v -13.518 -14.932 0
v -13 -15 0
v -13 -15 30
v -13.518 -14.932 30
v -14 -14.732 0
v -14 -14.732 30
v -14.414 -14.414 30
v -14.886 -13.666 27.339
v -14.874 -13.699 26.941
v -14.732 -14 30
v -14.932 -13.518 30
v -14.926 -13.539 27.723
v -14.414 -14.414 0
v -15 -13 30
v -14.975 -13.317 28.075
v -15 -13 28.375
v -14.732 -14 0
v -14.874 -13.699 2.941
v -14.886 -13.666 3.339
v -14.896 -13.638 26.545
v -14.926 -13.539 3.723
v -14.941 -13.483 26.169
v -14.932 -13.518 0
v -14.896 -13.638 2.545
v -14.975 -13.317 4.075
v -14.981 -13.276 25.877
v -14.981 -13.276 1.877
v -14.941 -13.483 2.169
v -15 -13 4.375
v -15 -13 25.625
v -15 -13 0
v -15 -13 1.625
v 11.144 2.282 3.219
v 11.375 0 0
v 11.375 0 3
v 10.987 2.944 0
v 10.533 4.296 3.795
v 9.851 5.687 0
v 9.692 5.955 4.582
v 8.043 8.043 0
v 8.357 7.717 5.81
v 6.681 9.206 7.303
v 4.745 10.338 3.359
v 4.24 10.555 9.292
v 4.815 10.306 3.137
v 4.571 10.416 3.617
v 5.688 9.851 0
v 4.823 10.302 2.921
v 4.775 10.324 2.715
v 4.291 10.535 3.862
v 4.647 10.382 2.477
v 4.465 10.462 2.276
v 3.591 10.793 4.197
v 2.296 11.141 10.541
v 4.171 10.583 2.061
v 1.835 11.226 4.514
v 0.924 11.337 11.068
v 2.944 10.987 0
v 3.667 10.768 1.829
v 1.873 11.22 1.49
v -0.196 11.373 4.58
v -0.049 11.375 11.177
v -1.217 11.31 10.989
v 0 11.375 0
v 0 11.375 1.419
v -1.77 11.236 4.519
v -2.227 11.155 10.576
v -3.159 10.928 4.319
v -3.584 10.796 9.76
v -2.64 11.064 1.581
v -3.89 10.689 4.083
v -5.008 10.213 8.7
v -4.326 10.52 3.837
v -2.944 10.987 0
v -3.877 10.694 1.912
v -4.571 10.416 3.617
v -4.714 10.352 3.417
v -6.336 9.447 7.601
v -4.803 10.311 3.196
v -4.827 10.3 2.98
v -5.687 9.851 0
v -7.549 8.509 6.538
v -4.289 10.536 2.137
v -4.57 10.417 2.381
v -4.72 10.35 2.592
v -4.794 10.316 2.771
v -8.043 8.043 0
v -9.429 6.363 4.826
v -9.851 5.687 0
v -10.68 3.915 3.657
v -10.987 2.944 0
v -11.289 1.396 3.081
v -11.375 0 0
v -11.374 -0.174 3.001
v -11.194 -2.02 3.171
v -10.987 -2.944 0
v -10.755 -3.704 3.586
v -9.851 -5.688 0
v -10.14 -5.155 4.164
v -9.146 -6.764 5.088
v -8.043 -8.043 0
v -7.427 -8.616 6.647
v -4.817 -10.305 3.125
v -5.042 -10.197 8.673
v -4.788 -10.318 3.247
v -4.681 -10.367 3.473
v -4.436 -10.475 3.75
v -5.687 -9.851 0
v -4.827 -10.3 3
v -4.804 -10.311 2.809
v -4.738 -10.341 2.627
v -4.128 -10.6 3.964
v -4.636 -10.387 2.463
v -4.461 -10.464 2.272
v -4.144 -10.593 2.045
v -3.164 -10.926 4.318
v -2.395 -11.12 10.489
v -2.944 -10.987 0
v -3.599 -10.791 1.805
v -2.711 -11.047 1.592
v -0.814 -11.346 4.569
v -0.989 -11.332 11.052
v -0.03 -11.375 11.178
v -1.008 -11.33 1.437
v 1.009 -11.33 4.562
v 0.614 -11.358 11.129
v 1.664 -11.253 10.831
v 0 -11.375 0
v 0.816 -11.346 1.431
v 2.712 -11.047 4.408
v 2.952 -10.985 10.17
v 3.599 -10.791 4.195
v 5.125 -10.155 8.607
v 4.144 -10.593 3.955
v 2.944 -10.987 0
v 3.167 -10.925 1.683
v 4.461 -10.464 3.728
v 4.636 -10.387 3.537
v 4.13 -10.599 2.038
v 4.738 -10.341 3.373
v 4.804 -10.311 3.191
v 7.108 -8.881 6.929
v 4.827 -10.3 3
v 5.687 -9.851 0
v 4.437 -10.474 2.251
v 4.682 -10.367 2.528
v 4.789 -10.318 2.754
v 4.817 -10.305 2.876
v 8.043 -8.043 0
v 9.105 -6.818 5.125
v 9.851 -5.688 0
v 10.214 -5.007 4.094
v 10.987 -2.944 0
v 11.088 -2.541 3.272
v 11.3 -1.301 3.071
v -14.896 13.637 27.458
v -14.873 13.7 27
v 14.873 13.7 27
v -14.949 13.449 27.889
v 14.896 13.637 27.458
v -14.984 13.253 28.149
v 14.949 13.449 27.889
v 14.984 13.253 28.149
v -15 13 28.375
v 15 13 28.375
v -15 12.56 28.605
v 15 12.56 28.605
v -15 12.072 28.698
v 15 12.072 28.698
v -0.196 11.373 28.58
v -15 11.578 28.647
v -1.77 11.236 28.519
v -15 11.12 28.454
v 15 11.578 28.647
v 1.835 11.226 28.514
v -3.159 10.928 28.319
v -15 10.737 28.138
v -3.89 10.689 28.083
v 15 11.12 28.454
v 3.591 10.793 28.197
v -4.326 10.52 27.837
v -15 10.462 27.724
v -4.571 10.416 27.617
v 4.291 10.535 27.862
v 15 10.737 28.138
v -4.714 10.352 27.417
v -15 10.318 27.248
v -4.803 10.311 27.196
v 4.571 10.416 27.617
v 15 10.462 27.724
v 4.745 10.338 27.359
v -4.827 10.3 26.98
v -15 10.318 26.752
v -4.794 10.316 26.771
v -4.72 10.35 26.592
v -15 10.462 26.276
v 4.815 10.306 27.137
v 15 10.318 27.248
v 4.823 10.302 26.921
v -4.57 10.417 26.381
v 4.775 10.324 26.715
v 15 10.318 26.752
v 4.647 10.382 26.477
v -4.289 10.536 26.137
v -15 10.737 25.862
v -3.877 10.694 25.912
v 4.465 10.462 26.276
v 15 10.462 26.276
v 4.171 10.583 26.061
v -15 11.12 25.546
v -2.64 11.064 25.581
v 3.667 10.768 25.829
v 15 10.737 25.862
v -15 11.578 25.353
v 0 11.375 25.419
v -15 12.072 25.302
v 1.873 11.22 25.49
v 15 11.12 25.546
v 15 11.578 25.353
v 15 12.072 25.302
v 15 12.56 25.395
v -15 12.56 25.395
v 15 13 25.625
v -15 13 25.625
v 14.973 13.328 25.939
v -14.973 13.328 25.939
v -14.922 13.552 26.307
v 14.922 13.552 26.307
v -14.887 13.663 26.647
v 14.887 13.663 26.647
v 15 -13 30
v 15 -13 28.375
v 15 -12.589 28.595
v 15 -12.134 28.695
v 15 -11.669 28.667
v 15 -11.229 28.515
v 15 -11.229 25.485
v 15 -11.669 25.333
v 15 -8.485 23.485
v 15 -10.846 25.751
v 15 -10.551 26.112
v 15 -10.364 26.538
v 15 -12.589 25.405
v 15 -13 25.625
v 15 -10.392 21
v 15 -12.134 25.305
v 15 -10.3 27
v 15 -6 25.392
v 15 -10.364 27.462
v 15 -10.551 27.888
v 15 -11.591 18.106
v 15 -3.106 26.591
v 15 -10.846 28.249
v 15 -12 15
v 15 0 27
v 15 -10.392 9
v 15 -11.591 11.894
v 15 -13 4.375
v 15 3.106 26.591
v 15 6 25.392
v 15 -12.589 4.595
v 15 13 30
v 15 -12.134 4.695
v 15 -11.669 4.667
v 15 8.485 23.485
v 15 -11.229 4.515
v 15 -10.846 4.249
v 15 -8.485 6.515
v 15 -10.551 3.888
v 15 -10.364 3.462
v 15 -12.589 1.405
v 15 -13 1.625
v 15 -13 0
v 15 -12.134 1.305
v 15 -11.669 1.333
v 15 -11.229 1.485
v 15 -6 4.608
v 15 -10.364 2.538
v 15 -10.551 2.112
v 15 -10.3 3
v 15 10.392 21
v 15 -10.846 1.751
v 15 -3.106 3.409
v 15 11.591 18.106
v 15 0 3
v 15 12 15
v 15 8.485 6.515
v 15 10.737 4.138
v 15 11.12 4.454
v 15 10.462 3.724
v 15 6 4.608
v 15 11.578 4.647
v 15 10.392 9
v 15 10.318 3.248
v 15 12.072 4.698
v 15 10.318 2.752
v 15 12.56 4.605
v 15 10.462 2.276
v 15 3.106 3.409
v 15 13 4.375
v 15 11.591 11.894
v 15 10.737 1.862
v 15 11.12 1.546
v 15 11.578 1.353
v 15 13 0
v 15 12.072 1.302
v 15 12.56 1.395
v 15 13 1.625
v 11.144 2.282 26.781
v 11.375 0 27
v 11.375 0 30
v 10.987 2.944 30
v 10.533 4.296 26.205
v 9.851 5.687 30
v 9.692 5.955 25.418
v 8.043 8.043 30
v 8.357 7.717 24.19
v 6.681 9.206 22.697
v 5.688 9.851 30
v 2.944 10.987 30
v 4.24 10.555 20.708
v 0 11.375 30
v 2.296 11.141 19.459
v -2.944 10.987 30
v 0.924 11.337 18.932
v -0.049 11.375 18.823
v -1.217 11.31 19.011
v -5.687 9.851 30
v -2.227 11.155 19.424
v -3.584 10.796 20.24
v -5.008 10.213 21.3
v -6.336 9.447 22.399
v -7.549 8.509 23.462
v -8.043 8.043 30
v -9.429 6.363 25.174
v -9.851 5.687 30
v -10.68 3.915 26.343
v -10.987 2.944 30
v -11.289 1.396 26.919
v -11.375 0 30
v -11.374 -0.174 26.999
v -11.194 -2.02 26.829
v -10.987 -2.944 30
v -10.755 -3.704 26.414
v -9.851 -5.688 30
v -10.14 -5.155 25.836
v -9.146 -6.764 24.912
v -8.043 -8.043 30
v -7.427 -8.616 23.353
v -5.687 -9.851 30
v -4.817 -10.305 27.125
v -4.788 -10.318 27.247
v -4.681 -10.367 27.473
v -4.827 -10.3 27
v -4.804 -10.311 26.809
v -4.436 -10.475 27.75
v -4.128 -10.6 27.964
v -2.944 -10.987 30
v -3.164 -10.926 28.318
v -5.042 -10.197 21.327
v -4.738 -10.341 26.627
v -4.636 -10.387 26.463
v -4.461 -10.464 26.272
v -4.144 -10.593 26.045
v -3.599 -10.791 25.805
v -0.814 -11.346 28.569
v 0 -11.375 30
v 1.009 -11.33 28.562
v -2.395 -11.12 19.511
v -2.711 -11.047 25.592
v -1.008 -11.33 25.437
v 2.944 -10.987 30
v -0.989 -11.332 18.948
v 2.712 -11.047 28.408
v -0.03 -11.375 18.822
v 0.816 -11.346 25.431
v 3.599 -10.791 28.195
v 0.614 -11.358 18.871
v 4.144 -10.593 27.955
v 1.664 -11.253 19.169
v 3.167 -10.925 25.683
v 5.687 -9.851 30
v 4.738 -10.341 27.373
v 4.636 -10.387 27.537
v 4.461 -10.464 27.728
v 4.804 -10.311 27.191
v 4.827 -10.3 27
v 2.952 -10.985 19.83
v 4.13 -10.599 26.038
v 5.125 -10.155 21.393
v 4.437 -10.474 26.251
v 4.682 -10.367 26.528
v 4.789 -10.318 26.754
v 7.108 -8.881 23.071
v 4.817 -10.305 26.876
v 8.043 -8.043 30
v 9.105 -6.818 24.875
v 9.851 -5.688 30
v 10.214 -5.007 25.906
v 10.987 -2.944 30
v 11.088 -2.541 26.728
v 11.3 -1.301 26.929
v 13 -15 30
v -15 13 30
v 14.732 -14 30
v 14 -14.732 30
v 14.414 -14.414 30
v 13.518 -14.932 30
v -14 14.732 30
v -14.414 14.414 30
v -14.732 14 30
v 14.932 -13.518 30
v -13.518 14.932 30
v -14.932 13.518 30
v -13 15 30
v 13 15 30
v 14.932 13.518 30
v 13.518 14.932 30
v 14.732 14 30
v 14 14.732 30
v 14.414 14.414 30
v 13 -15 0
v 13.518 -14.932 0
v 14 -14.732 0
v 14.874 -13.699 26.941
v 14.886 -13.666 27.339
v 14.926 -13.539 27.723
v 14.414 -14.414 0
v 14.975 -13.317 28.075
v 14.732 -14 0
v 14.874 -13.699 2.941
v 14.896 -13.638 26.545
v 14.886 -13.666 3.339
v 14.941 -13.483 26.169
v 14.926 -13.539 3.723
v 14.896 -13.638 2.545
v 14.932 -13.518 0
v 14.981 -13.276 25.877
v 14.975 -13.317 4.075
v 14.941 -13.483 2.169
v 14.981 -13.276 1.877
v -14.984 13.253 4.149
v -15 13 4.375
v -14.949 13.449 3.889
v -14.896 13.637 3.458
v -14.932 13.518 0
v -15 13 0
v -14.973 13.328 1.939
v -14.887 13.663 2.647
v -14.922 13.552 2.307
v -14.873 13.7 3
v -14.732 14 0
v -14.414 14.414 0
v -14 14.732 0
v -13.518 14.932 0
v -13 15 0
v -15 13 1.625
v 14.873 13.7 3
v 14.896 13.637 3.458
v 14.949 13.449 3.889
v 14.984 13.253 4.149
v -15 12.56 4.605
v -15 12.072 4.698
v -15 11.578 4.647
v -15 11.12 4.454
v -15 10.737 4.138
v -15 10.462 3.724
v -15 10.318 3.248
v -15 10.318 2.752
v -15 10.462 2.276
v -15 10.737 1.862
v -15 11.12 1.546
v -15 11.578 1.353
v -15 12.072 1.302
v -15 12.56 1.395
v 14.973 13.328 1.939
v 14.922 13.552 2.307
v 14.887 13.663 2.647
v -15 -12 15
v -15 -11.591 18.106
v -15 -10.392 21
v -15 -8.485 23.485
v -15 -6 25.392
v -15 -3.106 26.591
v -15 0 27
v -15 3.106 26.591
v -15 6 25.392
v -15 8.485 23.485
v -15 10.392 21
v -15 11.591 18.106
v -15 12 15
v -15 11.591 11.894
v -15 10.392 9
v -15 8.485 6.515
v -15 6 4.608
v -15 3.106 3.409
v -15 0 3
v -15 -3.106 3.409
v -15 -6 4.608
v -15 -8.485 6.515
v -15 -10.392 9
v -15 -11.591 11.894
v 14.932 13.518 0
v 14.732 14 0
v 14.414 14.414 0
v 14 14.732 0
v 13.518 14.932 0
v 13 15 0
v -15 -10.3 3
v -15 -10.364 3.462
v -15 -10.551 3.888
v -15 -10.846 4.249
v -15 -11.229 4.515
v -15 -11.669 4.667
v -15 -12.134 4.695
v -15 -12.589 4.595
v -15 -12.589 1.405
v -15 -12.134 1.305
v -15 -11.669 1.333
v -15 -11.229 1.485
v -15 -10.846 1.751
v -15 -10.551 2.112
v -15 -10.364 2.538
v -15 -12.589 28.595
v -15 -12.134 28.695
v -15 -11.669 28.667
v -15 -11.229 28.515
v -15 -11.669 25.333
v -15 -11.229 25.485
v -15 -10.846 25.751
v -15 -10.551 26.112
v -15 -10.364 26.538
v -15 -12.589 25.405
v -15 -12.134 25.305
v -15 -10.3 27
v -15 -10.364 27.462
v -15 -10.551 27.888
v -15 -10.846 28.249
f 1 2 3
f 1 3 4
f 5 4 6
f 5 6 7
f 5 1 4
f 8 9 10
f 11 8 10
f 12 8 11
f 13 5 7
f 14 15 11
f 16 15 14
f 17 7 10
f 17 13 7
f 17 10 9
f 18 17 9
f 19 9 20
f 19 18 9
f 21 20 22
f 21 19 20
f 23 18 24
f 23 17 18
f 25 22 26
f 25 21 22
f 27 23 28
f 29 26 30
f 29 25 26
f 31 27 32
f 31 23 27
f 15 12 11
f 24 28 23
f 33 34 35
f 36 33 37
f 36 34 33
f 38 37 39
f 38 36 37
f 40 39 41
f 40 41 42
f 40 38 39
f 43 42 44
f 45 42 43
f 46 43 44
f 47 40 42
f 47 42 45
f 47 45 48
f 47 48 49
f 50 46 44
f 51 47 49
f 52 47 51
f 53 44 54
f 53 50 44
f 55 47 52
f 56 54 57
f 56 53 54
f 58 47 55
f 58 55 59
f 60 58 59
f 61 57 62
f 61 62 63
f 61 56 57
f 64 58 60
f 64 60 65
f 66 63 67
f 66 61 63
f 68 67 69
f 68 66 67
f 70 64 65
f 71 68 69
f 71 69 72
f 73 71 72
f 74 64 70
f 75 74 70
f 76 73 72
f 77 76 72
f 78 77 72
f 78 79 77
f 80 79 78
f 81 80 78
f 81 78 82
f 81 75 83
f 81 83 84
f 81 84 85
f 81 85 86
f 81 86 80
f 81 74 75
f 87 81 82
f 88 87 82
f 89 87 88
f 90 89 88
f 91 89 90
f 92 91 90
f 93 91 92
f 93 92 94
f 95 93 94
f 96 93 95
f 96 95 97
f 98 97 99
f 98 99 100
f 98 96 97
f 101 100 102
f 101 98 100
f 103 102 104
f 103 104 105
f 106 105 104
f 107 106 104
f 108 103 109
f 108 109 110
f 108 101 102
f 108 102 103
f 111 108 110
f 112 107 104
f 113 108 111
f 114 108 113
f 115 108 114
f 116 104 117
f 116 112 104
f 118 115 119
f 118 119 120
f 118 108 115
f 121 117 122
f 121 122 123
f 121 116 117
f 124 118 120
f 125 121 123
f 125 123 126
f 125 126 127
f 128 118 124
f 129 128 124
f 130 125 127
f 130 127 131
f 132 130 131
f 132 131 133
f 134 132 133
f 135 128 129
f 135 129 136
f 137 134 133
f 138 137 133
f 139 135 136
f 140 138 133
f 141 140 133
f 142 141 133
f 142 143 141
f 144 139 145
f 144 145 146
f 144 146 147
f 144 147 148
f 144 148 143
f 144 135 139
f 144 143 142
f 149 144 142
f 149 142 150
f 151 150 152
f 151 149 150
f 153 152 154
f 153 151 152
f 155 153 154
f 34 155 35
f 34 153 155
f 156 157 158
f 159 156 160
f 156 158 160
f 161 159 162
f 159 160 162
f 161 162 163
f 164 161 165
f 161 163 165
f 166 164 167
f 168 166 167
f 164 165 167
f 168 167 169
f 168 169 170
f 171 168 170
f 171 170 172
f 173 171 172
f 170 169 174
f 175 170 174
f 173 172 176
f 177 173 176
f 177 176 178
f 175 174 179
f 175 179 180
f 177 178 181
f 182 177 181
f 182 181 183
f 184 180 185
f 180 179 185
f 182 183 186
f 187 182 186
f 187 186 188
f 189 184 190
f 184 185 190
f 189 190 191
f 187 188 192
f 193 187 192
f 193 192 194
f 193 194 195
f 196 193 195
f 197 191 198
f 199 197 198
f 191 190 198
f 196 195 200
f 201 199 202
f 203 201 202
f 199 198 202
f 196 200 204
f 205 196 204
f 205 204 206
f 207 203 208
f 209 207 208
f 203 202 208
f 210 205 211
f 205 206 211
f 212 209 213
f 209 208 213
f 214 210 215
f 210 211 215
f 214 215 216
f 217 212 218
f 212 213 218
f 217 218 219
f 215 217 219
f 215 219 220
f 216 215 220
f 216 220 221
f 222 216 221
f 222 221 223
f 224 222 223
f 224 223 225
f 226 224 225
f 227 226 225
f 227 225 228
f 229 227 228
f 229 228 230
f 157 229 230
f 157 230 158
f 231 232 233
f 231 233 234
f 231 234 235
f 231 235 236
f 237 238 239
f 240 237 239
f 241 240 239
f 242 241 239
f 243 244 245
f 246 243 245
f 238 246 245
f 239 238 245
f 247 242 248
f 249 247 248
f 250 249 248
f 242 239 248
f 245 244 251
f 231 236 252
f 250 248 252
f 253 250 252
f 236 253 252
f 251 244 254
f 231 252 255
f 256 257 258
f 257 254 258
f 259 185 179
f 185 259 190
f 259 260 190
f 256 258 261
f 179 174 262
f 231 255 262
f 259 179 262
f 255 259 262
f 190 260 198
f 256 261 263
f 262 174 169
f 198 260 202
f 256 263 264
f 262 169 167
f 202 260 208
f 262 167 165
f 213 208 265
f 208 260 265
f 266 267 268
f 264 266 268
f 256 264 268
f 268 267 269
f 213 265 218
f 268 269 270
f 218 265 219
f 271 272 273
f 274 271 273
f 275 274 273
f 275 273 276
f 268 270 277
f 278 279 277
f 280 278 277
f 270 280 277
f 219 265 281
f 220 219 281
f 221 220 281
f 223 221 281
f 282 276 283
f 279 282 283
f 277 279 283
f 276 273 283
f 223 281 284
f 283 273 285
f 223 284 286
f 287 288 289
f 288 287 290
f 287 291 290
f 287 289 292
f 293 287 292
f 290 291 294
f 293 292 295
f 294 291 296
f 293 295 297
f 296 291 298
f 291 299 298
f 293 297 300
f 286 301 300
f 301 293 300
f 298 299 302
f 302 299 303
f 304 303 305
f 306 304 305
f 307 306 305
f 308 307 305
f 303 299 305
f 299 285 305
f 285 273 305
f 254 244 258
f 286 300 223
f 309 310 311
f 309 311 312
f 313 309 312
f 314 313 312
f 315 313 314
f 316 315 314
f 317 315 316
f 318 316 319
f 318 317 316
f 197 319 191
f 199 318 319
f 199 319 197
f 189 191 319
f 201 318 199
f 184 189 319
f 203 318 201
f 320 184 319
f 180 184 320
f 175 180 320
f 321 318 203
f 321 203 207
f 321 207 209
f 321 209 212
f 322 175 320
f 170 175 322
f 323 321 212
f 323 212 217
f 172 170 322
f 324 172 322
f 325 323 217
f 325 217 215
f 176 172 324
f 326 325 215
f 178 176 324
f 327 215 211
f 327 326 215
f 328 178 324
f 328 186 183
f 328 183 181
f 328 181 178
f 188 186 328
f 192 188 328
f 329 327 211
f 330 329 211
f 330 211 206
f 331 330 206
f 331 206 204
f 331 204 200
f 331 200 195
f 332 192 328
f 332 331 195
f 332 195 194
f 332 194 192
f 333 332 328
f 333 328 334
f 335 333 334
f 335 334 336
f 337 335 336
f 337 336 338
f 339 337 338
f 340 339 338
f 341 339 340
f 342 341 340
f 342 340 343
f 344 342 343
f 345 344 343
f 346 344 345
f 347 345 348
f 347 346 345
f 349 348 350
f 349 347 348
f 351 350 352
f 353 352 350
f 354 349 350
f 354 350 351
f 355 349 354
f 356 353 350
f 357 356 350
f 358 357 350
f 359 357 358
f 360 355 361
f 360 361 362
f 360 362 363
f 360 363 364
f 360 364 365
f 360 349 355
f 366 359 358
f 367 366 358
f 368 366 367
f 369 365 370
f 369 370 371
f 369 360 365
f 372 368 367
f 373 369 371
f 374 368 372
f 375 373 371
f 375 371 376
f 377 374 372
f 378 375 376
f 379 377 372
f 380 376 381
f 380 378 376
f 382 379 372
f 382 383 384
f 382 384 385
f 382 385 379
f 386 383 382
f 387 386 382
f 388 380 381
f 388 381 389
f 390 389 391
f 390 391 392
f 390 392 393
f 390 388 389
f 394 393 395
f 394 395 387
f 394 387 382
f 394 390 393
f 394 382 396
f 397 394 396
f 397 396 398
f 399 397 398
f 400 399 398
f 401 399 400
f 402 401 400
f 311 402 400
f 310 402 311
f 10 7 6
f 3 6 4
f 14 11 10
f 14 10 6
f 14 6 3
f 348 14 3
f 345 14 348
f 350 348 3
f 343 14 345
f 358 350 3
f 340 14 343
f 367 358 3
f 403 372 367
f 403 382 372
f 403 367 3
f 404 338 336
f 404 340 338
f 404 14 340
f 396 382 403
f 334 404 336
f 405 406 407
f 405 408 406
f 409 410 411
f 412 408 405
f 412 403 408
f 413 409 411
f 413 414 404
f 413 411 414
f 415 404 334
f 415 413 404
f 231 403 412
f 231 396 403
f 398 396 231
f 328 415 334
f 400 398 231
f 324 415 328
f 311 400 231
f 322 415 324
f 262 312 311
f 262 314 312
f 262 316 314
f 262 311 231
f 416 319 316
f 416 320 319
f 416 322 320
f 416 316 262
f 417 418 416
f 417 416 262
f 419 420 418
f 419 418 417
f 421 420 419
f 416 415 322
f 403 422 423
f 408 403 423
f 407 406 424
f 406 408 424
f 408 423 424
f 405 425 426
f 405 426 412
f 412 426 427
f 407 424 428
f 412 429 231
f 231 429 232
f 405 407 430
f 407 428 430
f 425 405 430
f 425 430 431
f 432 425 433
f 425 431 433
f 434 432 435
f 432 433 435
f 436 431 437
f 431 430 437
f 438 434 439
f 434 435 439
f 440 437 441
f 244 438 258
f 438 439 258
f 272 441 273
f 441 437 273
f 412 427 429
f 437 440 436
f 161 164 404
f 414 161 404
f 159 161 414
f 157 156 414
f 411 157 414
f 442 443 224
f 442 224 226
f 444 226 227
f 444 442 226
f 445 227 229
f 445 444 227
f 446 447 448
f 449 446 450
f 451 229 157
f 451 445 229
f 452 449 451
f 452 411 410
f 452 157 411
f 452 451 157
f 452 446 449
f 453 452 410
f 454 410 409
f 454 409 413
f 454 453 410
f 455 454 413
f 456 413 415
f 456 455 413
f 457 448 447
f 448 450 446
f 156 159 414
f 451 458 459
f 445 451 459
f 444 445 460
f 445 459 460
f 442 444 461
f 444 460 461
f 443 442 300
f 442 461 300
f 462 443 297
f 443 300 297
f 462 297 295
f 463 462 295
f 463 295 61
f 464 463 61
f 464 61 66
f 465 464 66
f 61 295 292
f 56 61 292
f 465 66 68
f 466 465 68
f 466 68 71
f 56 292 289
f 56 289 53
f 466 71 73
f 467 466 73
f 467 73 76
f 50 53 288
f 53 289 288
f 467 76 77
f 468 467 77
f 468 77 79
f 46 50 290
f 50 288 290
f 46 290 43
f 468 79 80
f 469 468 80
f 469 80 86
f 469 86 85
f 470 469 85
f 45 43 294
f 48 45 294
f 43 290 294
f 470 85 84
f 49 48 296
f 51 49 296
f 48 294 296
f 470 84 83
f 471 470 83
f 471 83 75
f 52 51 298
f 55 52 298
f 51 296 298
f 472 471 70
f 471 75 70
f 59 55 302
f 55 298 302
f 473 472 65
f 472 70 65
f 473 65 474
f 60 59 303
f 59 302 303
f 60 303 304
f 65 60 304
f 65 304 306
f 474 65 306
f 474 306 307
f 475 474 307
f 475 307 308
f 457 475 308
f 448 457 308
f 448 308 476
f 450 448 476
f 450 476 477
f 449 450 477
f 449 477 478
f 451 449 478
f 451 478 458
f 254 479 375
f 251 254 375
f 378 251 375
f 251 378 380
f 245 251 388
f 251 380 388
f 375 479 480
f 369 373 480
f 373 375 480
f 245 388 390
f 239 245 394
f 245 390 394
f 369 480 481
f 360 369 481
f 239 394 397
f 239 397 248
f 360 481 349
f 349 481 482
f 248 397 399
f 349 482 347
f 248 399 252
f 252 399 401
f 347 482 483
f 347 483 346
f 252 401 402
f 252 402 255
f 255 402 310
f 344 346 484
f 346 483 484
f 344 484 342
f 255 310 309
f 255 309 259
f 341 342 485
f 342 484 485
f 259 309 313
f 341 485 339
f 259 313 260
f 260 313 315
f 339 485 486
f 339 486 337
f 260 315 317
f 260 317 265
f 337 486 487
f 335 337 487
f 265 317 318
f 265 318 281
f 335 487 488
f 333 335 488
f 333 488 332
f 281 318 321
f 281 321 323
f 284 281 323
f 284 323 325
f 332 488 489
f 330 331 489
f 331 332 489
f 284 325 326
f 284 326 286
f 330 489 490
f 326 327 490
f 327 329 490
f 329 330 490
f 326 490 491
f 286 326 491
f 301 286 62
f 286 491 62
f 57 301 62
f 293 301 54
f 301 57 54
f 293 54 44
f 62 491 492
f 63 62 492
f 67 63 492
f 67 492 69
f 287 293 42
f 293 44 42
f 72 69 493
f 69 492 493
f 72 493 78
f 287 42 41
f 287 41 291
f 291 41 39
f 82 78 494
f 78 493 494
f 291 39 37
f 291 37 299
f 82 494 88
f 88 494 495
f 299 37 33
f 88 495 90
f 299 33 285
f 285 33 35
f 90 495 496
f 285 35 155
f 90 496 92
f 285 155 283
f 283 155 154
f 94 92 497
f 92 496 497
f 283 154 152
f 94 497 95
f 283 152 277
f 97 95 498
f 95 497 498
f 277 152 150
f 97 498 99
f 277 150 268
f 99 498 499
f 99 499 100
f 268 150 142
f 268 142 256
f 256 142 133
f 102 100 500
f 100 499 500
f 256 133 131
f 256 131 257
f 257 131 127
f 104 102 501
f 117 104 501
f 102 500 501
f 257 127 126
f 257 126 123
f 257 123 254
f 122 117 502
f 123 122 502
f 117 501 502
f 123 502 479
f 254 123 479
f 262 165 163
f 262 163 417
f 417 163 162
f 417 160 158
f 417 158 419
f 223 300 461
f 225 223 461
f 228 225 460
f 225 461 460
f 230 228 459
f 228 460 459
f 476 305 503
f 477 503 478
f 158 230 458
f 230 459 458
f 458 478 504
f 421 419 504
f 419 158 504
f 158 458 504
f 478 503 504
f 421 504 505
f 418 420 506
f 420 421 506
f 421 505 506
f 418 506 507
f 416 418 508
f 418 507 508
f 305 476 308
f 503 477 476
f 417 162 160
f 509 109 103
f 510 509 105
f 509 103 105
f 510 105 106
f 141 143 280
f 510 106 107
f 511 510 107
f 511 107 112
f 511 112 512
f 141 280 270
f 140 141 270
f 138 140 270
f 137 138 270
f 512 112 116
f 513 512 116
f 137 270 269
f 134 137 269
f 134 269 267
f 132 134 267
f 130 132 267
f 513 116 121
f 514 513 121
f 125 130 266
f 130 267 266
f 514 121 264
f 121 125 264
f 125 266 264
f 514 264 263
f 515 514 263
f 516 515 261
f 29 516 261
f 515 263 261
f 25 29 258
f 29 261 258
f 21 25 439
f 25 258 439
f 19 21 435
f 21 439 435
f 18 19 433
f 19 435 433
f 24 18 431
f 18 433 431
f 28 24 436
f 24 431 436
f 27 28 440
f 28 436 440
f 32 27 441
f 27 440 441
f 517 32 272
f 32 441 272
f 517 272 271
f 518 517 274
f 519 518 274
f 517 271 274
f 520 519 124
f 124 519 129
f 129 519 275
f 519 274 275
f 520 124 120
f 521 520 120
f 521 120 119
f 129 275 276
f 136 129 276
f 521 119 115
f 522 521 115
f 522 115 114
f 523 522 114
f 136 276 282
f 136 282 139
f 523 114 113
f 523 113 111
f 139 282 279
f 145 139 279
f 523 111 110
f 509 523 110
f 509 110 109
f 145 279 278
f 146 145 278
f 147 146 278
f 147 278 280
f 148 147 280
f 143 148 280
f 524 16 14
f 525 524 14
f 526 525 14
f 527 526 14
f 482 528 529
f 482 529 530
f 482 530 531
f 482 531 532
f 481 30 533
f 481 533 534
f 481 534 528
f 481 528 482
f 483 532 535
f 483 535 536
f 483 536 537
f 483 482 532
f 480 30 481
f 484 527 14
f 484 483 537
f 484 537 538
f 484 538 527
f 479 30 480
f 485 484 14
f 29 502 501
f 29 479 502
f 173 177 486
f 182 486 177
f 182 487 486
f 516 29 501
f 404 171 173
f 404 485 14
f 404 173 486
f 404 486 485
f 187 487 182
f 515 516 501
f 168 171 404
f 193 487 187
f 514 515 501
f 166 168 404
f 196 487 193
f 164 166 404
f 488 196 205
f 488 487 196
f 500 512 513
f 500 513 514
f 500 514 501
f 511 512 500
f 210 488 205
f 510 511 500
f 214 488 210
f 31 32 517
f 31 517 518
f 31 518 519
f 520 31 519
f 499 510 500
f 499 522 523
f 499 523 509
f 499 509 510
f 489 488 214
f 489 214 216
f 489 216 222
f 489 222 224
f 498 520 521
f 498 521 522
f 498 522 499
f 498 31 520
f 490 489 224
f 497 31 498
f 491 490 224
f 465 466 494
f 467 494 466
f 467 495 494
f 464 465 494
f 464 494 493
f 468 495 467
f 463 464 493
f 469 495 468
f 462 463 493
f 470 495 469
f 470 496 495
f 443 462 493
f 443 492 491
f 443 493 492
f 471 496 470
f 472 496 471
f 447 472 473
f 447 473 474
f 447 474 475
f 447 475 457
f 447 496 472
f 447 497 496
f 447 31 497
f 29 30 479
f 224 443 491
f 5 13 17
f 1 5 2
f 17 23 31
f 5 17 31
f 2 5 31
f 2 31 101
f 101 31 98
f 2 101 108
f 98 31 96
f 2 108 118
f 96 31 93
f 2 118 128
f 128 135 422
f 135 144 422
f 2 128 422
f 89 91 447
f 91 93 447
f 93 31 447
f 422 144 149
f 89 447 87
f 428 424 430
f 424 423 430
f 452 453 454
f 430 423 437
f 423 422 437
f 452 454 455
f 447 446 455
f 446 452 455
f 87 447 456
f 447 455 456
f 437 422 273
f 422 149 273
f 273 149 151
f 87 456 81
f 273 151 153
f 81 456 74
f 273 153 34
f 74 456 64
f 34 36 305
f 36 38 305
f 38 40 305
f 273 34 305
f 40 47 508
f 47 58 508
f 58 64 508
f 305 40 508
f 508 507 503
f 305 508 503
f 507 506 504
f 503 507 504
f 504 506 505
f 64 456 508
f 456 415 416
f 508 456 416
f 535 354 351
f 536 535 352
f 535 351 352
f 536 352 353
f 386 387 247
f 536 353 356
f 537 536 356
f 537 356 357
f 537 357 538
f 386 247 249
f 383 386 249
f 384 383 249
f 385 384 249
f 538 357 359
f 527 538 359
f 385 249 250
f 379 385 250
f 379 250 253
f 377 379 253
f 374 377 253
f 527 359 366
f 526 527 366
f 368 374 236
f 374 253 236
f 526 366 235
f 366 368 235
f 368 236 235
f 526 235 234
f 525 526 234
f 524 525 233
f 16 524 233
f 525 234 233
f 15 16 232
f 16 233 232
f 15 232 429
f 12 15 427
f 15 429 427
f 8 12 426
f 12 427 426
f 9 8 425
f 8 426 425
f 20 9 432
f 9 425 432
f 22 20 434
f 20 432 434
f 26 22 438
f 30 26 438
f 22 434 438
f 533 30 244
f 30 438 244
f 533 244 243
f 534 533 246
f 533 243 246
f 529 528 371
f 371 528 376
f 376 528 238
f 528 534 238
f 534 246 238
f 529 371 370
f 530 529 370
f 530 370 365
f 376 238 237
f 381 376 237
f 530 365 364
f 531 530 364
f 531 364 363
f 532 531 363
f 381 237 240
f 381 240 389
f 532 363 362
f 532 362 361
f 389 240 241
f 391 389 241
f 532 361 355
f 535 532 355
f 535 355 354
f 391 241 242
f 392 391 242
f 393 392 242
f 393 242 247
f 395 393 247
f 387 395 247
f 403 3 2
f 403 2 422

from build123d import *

# Parameters (mm, degrees)
F0_W        = 30
F0_H        = 30
F0_R        = 11.375
F1_DEPTH    = 30
F3_D        = 3.4
F4_T1_DEPTH = 40
F2_R        = 12
F5_DEPTH    = 30.0010001


# Not quite as in the source:
# - a fillet or chamfer that OpenCascade refuses, or shapes differently, is made with other operations: its cross-section is extruded or revolved along the edge and cut away or added


with BuildPart() as f1:
    # F0 (on Top) → F1 (new body)
    with BuildSketch(Plane.XY):
        Rectangle(F0_W, F0_H)
        Circle(F0_R, mode=Mode.SUBTRACT)
    extrude(amount=F1_DEPTH)

    # F3 (through all)
    with Locations(Plane(origin=(-15, 0, 0), x_dir=(0, -1, 0), z_dir=(-1, 0, 0))):
        with Locations((-12, 27), (12, 27), (12, 3), (-12, 3)):
            Hole(F3_D / 2)

    # F4: fillet of radius 2 on 4 edges, made by hand

    # F4_s2 → F4_t1 (cut)
    with BuildSketch(Plane.XY.offset(-5)):
        with BuildLine():
            ThreePointArc((15, 13), (14.4142135624, 14.4142135624), (13, 15))
            Line((13, 15), (15, 15))
            Line((15, 15), (15, 13))
        make_face()
        with BuildLine():
            ThreePointArc((-15, 13), (-14.4142135624, 14.4142135624), (-13, 15))
            Line((-13, 15), (-15, 15))
            Line((-15, 15), (-15, 13))
        make_face()
        with BuildLine():
            ThreePointArc((-13, -15), (-14.4142135624, -14.4142135624), (-15, -13))
            Line((-15, -13), (-15, -15))
            Line((-15, -15), (-13, -15))
        make_face()
        with BuildLine():
            ThreePointArc((13, -15), (14.4142135624, -14.4142135624), (15, -13))
            Line((15, -13), (15, -15))
            Line((15, -15), (13, -15))
        make_face()
    extrude(amount=F4_T1_DEPTH, mode=Mode.SUBTRACT)

    # F2 (on face) → F5 (cut, through all)
    with BuildSketch(Plane(origin=(-15, 0, 0), x_dir=(0, -1, 0), z_dir=(-1, 0, 0))):
        with Locations((0, 15)):
            Circle(F2_R)
    extrude(amount=-F5_DEPTH, mode=Mode.SUBTRACT)


solid = f1.part
